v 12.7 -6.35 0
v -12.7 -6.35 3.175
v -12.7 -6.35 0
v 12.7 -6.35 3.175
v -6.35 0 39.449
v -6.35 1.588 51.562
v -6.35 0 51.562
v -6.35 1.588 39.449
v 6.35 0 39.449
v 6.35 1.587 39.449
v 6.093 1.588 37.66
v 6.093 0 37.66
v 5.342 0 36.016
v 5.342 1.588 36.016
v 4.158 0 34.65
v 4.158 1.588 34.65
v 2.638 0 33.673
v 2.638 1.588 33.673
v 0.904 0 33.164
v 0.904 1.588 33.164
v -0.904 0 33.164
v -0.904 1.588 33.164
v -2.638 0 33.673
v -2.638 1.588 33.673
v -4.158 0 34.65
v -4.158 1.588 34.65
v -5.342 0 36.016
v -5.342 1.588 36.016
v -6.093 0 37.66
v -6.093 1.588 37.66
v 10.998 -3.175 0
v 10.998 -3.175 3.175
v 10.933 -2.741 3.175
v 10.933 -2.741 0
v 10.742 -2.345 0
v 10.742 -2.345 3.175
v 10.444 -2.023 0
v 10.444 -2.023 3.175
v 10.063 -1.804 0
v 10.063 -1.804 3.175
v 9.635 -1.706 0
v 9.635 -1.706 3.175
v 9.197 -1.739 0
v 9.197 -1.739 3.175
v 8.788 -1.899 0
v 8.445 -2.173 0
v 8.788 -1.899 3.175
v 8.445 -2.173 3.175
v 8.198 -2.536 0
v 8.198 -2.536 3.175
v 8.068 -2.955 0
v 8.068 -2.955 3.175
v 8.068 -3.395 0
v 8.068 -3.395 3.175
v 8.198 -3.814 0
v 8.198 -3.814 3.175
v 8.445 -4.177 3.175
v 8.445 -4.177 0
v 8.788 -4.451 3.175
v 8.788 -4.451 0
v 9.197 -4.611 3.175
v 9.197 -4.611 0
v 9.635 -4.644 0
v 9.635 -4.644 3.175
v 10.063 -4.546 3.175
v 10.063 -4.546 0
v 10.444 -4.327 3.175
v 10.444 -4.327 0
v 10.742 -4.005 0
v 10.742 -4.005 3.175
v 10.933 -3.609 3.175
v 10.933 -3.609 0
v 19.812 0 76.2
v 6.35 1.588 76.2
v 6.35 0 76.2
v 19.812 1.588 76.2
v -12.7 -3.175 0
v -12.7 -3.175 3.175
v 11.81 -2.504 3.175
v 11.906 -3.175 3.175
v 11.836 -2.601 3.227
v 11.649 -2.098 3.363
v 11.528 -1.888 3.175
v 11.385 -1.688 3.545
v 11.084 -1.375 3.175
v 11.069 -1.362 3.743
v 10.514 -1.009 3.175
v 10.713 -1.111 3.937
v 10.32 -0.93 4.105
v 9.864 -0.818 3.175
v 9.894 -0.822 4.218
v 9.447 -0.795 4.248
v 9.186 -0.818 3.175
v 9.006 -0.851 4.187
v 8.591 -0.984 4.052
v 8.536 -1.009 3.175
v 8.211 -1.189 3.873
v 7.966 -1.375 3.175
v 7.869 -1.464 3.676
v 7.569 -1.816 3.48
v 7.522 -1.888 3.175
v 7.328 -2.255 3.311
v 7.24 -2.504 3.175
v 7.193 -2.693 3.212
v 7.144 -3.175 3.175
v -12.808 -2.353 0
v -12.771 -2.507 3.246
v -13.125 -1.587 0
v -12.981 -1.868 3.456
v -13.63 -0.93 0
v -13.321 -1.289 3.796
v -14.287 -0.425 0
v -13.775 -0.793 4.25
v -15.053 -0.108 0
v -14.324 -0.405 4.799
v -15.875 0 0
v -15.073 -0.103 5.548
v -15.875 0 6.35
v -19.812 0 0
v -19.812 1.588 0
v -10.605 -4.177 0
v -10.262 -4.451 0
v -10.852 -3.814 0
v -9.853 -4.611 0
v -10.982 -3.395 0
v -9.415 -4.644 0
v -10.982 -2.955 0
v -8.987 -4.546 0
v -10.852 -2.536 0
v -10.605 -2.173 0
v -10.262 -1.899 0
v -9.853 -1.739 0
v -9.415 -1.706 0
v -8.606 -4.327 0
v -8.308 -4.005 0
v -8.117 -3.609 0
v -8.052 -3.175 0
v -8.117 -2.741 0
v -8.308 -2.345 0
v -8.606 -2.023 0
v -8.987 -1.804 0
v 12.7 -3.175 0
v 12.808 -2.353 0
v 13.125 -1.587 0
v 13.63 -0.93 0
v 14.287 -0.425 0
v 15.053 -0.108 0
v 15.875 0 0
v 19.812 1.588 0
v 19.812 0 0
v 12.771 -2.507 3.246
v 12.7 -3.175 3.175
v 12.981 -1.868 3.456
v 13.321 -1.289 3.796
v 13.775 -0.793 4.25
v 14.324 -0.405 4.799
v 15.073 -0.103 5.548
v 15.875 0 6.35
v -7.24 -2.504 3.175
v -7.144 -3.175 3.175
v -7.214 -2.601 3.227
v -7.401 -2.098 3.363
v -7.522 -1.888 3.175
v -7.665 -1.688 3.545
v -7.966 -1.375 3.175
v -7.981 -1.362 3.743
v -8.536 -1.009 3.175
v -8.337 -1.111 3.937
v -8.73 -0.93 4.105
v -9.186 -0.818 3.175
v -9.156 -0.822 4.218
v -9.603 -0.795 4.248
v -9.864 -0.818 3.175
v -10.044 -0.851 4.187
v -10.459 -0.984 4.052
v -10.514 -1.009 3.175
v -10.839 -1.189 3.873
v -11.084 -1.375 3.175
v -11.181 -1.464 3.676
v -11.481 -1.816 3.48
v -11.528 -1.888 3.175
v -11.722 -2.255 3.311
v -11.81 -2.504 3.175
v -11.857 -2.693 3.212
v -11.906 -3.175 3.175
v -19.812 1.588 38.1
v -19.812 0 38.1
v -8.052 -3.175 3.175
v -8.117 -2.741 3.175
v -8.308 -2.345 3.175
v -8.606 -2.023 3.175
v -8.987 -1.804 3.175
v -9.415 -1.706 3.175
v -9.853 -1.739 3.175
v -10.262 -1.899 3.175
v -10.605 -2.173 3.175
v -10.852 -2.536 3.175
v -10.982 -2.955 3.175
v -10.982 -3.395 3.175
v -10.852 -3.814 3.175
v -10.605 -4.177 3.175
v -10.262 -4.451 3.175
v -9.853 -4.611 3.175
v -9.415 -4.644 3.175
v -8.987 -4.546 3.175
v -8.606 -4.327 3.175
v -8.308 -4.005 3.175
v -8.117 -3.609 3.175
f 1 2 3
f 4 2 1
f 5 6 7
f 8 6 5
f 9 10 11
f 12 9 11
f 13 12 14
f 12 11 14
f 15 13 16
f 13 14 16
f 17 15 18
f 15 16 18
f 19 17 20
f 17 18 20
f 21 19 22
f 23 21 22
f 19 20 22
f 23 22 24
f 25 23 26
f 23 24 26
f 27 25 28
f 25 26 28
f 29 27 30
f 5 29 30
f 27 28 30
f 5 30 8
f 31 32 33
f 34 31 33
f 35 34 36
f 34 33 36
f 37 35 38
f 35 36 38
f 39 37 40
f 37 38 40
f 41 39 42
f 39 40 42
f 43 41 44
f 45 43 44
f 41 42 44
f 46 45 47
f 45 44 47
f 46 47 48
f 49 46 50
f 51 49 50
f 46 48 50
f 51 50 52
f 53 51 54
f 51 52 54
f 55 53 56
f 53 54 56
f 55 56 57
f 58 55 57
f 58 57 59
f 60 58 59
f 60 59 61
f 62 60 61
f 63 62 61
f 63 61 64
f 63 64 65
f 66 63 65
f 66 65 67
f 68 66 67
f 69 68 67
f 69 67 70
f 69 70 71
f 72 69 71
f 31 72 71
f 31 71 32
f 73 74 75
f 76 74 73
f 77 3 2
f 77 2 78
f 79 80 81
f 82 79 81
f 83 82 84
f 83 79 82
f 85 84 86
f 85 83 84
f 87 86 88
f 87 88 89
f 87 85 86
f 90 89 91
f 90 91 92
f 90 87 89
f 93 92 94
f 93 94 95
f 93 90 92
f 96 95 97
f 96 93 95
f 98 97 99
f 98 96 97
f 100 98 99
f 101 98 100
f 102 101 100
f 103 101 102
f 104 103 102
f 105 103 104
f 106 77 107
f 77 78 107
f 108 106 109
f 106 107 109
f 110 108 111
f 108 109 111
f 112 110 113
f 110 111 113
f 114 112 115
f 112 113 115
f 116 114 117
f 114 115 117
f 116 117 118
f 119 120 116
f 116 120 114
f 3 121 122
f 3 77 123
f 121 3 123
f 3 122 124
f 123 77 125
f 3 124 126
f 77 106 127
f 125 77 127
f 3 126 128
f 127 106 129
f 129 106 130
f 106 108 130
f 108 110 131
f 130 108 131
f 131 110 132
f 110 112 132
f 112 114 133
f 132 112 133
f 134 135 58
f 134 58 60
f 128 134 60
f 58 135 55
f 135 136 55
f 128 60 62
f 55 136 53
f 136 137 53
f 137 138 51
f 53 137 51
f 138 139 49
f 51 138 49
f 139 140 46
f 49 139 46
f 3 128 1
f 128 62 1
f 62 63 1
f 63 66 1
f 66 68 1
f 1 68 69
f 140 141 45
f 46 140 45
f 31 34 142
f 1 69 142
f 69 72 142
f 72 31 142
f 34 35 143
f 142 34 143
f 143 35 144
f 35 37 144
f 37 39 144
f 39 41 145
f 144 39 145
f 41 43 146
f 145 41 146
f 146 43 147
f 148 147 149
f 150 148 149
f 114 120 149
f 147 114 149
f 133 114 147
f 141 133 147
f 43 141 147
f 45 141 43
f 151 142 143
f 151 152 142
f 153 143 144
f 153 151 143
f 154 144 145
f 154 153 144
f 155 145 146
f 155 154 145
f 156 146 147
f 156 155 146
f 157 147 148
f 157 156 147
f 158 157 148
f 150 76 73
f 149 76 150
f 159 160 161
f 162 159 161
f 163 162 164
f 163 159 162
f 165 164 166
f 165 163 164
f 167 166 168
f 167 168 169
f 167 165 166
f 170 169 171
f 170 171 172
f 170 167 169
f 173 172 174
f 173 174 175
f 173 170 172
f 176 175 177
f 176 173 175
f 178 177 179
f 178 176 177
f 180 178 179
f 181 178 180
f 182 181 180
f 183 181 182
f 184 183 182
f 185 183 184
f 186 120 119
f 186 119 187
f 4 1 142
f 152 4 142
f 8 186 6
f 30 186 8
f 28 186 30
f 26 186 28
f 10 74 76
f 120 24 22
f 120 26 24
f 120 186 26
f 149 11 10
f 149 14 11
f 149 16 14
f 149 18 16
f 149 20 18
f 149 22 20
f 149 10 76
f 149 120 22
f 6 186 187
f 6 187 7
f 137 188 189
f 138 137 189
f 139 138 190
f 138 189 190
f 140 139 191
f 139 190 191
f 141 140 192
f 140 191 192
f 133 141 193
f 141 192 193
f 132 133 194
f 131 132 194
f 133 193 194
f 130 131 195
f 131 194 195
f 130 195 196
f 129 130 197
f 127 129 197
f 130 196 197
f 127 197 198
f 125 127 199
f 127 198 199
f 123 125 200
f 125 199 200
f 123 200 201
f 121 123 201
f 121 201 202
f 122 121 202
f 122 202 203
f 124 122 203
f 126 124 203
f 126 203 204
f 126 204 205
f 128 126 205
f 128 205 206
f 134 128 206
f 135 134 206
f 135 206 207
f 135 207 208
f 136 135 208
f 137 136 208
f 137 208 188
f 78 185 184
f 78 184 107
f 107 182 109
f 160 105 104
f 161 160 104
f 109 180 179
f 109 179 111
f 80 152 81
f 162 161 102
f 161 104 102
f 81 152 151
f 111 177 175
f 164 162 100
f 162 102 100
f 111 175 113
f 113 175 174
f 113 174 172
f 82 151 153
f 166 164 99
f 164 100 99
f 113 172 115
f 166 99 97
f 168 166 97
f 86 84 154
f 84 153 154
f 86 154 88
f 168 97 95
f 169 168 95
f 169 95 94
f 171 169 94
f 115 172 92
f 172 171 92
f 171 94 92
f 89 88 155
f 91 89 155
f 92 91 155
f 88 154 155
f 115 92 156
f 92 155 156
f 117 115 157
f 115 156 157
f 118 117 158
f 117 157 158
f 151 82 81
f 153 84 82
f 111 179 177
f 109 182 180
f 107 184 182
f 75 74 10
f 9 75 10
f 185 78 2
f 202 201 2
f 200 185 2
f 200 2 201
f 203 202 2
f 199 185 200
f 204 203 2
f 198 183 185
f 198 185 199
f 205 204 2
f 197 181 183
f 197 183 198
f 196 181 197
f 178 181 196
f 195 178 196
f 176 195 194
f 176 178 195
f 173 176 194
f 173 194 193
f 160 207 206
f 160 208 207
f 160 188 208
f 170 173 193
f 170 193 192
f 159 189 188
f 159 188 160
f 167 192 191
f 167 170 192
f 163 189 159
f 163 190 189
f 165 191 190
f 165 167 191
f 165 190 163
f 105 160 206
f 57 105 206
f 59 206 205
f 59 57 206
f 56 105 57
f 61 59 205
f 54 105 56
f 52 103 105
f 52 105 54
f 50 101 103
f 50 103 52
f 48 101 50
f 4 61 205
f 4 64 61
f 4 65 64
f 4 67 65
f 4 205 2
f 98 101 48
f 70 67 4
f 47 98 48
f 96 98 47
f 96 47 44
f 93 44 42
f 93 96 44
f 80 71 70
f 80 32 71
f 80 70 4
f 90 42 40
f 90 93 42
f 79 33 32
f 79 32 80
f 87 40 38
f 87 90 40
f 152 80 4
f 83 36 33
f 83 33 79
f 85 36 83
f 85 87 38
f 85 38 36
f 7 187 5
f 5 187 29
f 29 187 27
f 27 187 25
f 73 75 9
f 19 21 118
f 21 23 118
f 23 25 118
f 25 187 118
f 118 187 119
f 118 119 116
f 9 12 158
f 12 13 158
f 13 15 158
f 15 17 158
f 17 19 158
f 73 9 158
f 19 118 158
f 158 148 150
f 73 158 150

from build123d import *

# Parameters (mm, degrees)
SKETCH1_W               = 39.624
SKETCH1_H               = 63.5
BOSS_EXTRUDE1_DEPTH     = 1.5875
SKETCH2_W               = 39.624
SKETCH2_H               = 3.175
BOSS_EXTRUDE2_DEPTH     = 6.35
SKETCH3_R               = 6.35
CUT_EXTRUDE1_DEPTH      = 8.9375
CUT_EXTRUDE2_DEPTH      = 1
CUT_EXTRUDE2_DEPTH_BACK = 8.9375
SKETCH5_W               = 12.7
SKETCH5_H               = 28.946652836
CUT_EXTRUDE3_DEPTH      = 8.9375
SKETCH6_W               = 13.462
SKETCH6_H               = 12.7
BOSS_EXTRUDE3_DEPTH     = 1.5875
SKETCH7_W               = 7.112
SKETCH7_H               = 6.35
CUT_EXTRUDE4_DEPTH      = 77.2
FILLET1_R               = 3.175
F_4_CLEARANCE_HOLE1_D   = 2.9464
SKETCH10_R              = 2.38125
CUT_EXTRUDE5_DEPTH      = 74.025


with BuildPart() as part:
    # Sketch1 → Boss-Extrude1 (new body)
    with BuildSketch(Plane(origin=(0, 0, 0), x_dir=(1, 0, 0), z_dir=(0, 1, 0))):
        with Locations((0, -31.75)):
            Rectangle(SKETCH1_W, SKETCH1_H)
    extrude(amount=BOSS_EXTRUDE1_DEPTH)

    # Sketch2 → Boss-Extrude2 (add)
    with BuildSketch(Plane.XZ):
        with Locations((0, 1.5875)):
            Rectangle(SKETCH2_W, SKETCH2_H)
    extrude(amount=BOSS_EXTRUDE2_DEPTH)

    # Sketch3 → Cut-Extrude1 (cut, through all)
    with BuildSketch(Plane(origin=(10.289309191, 1.5875, 36.06936054), x_dir=(1, 0, 0), z_dir=(0, 1, 0))):
        with Locations((-10.289309191, -3.379645711)):
            Circle(SKETCH3_R)
    extrude(amount=-CUT_EXTRUDE1_DEPTH, mode=Mode.SUBTRACT)

    # Sketch4 → Cut-Extrude2 (cut, two sides)
    with BuildSketch(Plane(origin=(0, 1.5875, 0), x_dir=(1, 0, 0), z_dir=(0, 1, 0))) as cut_extrude2_sk:
        Polygon((-19.812, -38.1), (5.588, -63.5), (-19.812, -63.5), align=None)
    extrude(amount=CUT_EXTRUDE2_DEPTH, mode=Mode.SUBTRACT)
    extrude(cut_extrude2_sk.sketch, amount=-CUT_EXTRUDE2_DEPTH_BACK, mode=Mode.SUBTRACT)

    # Sketch5 → Cut-Extrude3 (cut, through all)
    with BuildSketch(Plane(origin=(0, 1.5875, 0), x_dir=(1, 0, 0), z_dir=(0, 1, 0))):
        with Locations((0, -53.922332669)):
            Rectangle(SKETCH5_W, SKETCH5_H)
    extrude(amount=-CUT_EXTRUDE3_DEPTH, mode=Mode.SUBTRACT)

    # Sketch6 → Boss-Extrude3 (add)
    with BuildSketch(Plane(origin=(0, 1.5875, 0), x_dir=(1, 0, 0), z_dir=(0, 1, 0))):
        with Locations((13.081, -69.85)):
            Rectangle(SKETCH6_W, SKETCH6_H)
    extrude(amount=-BOSS_EXTRUDE3_DEPTH)

    # Sketch7 → Cut-Extrude4 (cut, through all)
    with BuildSketch(Plane(origin=(0, 0, 0), x_dir=(-1, 0, 0), z_dir=(0, 0, -1))):
        with Locations((-16.256, -3.175)):
            Rectangle(SKETCH7_W, SKETCH7_H)
        with Locations((16.256, -3.175)):
            Rectangle(SKETCH7_W, SKETCH7_H)
    extrude(amount=-CUT_EXTRUDE4_DEPTH, mode=Mode.SUBTRACT)

    # Fillet1
    fillet1_edges = [part.edges().sort_by_distance(p)[0] for p in [
        (-12.7, 0, 1.5875),
        (0, 0, 3.175),
        (12.7, 0, 1.5875),
    ]]
    fillet(fillet1_edges, radius=FILLET1_R)

    # #4 Clearance Hole1 (through all)
    with Locations(Plane(origin=(0, 0, 0), x_dir=(-1, 0, 0), z_dir=(0, 0, -1))):
        with Locations((-9.525, -3.175), (9.525, -3.175)):
            Hole(F_4_CLEARANCE_HOLE1_D / 2)

    # Sketch10 → Cut-Extrude5 (cut, through all)
    with BuildSketch(Plane.XY.offset(3.175)):
        with Locations((9.525, -3.175)):
            Circle(SKETCH10_R)
        with Locations((-9.525, -3.175)):
            Circle(SKETCH10_R)
    extrude(amount=CUT_EXTRUDE5_DEPTH, mode=Mode.SUBTRACT)


solid = part.part
